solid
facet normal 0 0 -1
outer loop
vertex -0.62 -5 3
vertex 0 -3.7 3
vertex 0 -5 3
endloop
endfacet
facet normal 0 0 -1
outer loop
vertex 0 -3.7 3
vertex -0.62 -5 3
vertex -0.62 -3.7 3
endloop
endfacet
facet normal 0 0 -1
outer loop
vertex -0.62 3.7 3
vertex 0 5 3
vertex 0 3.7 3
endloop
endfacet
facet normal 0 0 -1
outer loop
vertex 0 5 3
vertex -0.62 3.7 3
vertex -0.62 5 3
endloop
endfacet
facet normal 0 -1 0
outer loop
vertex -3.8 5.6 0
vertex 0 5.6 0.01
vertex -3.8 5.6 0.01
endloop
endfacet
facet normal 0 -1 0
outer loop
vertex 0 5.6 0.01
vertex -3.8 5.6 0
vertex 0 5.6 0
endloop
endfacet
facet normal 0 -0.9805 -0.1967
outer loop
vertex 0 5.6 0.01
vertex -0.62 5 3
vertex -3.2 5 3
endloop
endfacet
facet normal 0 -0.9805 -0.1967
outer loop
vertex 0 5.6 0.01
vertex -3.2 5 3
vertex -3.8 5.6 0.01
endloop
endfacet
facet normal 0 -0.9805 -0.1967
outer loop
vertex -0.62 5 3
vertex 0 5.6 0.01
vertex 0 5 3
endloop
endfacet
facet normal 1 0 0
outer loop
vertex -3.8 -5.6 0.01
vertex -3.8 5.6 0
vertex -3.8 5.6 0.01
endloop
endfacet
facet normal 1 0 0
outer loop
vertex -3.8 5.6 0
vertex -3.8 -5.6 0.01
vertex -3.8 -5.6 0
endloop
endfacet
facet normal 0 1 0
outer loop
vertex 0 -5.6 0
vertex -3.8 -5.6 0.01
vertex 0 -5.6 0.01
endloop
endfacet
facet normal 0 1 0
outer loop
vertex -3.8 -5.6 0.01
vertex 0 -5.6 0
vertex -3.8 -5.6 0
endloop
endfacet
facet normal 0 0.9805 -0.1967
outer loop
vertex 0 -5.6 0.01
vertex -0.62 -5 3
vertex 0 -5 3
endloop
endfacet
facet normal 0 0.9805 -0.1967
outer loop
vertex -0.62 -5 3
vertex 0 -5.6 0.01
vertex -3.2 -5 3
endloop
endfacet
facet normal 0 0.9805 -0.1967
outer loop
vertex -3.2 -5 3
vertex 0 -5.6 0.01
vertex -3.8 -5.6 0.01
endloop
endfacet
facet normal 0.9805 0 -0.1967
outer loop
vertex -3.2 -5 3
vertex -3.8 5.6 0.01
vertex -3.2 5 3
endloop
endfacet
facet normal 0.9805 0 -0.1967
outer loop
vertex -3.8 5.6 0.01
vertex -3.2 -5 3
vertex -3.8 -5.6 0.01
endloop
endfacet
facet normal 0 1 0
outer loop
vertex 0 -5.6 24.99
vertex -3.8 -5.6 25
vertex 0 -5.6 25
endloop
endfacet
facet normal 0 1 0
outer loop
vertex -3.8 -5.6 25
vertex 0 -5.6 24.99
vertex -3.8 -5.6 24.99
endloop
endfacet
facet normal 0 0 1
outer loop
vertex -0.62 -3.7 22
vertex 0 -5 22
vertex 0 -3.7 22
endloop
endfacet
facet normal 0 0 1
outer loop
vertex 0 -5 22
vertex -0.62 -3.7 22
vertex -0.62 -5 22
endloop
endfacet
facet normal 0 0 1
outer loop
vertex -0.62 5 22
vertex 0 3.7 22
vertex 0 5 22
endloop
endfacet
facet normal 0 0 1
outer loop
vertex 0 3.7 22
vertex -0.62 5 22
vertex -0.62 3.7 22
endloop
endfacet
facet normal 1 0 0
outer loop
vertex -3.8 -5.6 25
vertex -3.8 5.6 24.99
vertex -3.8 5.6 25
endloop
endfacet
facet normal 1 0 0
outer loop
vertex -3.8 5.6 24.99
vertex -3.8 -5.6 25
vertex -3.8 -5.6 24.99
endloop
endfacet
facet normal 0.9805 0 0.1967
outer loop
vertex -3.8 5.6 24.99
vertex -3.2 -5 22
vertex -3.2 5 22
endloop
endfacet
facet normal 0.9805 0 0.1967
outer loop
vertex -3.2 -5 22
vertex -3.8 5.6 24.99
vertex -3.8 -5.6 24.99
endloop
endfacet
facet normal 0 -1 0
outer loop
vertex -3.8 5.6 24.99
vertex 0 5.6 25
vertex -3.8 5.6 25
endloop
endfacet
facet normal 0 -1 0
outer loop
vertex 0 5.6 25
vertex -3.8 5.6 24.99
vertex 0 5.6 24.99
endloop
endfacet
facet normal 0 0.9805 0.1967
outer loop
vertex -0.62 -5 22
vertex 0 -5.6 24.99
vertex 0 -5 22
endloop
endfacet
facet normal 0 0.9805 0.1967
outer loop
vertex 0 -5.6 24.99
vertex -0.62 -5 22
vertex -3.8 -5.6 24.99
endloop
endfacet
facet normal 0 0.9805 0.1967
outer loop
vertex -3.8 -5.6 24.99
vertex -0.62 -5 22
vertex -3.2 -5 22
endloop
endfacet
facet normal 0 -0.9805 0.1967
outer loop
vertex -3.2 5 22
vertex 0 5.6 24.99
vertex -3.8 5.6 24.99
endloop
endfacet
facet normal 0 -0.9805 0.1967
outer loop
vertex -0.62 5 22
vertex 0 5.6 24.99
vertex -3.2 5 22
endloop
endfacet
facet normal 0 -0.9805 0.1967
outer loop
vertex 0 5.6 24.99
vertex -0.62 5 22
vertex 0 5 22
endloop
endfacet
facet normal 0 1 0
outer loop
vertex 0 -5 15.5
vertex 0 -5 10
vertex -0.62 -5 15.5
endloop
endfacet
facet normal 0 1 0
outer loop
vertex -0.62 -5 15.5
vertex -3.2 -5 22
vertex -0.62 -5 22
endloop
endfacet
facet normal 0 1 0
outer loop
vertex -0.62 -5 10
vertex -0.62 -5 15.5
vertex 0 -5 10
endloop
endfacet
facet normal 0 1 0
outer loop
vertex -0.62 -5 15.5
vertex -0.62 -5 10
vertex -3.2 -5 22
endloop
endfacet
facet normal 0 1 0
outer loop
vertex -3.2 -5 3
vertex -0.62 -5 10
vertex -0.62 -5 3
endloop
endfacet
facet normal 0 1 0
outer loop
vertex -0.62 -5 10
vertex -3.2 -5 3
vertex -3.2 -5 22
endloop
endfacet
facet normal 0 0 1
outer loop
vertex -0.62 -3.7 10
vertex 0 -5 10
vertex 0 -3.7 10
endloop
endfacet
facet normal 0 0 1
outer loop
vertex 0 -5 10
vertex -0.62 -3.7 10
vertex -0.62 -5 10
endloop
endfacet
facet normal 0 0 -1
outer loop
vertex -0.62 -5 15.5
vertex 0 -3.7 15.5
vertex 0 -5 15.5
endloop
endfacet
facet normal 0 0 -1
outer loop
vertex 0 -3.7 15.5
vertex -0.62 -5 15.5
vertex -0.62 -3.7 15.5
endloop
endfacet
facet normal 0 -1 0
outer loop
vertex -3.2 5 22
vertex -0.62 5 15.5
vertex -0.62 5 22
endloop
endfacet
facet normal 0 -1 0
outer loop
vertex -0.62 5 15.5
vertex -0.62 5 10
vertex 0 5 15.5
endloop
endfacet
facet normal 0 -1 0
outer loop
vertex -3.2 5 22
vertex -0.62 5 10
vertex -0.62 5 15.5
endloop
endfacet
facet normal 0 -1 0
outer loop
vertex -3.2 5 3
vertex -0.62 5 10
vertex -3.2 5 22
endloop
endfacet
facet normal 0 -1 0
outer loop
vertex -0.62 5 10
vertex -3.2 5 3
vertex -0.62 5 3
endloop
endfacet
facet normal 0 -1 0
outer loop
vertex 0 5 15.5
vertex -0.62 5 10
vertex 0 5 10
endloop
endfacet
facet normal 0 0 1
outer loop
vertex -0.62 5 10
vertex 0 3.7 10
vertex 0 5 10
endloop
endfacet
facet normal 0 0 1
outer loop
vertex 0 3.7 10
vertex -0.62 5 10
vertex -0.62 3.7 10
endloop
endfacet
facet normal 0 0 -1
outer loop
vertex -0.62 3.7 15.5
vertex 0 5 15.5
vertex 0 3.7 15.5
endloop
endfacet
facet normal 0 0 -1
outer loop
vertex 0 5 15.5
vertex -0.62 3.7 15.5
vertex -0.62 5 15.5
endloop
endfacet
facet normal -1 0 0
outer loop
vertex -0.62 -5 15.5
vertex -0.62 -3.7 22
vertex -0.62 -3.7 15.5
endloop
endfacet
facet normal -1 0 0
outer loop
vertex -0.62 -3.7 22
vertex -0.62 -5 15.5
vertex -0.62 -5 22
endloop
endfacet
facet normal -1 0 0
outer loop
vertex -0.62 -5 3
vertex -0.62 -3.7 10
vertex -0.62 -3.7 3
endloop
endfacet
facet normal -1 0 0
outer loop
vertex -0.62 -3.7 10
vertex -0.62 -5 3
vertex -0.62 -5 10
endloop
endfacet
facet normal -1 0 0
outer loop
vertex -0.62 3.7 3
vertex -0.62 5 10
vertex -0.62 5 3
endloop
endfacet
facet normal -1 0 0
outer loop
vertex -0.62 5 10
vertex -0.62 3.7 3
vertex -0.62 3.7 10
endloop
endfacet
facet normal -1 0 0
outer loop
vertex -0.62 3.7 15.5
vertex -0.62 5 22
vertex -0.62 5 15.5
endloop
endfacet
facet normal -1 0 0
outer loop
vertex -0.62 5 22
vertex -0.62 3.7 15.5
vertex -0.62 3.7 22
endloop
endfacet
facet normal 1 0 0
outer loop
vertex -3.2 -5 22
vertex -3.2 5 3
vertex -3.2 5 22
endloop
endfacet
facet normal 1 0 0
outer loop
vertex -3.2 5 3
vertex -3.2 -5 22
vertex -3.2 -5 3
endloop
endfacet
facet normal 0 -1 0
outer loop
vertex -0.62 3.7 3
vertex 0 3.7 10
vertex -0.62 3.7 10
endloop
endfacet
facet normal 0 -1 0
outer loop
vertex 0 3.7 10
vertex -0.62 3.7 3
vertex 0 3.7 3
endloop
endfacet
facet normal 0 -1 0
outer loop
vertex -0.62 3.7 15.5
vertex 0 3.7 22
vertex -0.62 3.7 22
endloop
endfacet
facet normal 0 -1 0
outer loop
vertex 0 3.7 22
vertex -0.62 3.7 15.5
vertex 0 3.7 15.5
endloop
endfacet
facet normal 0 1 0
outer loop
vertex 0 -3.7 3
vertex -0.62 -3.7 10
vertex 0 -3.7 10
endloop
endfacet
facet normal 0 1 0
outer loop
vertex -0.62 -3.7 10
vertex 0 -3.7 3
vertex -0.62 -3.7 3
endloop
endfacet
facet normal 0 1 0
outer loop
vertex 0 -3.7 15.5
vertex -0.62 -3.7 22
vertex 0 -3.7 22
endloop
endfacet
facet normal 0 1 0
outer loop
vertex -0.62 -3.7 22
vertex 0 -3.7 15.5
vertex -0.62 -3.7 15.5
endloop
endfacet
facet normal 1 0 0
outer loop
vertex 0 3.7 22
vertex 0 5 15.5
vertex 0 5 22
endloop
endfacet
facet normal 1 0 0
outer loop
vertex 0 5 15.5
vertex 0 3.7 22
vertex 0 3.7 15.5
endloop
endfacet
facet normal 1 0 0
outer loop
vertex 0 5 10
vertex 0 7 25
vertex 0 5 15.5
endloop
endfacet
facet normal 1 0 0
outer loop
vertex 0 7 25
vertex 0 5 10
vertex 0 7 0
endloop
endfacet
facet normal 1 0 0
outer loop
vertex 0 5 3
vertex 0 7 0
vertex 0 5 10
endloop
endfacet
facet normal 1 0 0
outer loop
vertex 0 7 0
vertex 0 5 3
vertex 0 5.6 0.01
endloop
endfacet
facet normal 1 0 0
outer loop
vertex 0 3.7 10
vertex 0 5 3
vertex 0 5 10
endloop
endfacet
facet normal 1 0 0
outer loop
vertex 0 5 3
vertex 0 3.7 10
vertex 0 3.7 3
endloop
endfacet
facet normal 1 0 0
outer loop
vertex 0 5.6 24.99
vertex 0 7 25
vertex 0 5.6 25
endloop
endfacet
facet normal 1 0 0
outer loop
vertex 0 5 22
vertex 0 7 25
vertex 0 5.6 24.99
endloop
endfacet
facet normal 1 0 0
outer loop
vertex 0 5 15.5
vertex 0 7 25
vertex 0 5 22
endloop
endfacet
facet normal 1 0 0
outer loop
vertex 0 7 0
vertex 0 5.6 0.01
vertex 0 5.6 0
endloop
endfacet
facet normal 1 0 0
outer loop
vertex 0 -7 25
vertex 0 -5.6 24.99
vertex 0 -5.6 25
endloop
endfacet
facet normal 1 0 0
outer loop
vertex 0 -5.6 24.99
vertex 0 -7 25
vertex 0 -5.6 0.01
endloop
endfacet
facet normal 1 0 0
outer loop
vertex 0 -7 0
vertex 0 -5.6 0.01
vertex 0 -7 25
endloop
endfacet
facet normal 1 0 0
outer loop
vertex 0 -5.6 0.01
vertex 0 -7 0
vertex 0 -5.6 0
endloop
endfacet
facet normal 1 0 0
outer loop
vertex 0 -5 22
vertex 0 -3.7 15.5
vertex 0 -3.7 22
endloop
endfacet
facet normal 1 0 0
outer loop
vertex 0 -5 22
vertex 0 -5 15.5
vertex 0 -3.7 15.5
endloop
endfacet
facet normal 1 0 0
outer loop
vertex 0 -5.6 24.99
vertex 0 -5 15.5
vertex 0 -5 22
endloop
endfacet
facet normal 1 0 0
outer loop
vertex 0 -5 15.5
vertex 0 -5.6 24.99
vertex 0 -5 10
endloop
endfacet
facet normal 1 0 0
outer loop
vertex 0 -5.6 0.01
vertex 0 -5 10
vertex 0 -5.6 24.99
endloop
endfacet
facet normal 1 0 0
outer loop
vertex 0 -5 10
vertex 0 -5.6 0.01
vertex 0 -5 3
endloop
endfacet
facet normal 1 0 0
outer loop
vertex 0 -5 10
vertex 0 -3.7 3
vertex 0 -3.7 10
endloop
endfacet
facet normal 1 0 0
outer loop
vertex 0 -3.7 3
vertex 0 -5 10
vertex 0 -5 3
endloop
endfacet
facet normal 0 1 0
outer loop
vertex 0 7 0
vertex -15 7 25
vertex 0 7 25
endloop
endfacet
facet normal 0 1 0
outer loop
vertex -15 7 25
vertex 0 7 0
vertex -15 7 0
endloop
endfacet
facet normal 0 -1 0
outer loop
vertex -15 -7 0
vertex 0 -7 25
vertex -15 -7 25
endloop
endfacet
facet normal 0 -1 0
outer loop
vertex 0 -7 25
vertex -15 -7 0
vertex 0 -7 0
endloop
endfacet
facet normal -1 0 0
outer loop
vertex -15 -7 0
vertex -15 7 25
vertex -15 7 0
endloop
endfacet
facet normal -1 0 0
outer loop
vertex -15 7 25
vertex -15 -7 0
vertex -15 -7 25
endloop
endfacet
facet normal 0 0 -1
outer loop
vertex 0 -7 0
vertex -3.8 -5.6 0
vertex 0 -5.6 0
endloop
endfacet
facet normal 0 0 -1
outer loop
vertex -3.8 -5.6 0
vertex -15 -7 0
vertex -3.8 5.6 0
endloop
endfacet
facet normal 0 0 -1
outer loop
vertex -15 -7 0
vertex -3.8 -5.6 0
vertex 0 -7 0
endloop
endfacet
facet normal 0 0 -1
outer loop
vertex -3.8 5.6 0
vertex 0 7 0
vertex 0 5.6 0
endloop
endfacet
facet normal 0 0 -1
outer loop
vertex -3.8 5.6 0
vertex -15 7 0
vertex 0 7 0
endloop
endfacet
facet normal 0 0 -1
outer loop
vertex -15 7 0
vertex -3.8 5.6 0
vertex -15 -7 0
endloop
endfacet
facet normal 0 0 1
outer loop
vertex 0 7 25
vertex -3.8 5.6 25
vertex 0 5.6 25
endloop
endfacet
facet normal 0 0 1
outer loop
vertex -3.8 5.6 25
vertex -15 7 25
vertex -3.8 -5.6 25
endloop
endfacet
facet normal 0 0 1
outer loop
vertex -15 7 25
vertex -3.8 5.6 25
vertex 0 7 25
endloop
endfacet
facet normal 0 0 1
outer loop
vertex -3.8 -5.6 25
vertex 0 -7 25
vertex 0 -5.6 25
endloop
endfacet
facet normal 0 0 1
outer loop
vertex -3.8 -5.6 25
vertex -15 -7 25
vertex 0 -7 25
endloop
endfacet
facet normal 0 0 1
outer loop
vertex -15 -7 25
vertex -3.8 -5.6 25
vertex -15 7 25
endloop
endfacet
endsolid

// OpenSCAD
// file: ../../lib/joycon_rail.scad
// ============================================================
// Nintendo Switch (1) Joy-Con female rail
// Part of ControllerCyclingMounts.  Use with:  use <../../lib/joycon_rail.scad>
//
// Profile measured from the community "Joycon Grip w/ Front Look LED
// Window" model and confirmed by test print (fits Switch 1 Joy-Cons).
// NOT compatible with Joy-Con 2 (magnetic attachment).
//
// Local frame for all modules here:
//   rail face at x = 0, material at x < 0
//   rail runs along +Y; the open end (where the Joy-Con's shoulder
//   end ends up) is at y = len, the closed end at y = 0
//   z = 0 is the rail centreline (Joy-Con is ~14 mm thick, centred)
// ============================================================

JC_SLOT_W   = 7.40;  // opening between the two lips
JC_LIP_T    = 0.62;  // lip thickness
JC_INNER_W  = 10.0;  // height of the undercut cavity
JC_INNER_D  = 2.58;  // depth of the cavity behind the lips
JC_RAIL_LEN = 92.5;  // channel length; the Joy-Con bottoms out at the end
JC_BODY_T   = 14;    // Joy-Con thickness at the rail

// Total depth of the channel below the rail face
function joycon_rail_depth() = JC_LIP_T + JC_INNER_D;

// Subtract this from a solid. The channel starts at y = len - rail_len
// and is open past y = len.
//   lead_in     flare at the entrance
//   notch_*     latch notches (cut into both lips)
//   end_slope   closed end sloped (x this many channel depths) so it
//               prints without bridging when the rail stands vertically
//   open_both_ends  for short test pieces
module joycon_rail_channel(len = JC_RAIL_LEN, rail_len = JC_RAIL_LEN,
                           lead_in = 0.6, notch_from = 10.0, notch_len = 5.5,
                           end_slope = 2, open_both_ends = false) {
    eps = 0.01;
    y0 = len - rail_len;
    cd = JC_LIP_T + JC_INNER_D;
    ext = open_both_ends ? 1 : 0;
    translate([-cd, y0 - ext, -JC_INNER_W/2]) cube([JC_INNER_D, rail_len + 1 + ext, JC_INNER_W]);
    translate([-JC_LIP_T - eps, y0 - ext, -JC_SLOT_W/2]) cube([JC_LIP_T + 1, rail_len + 1 + ext, JC_SLOT_W]);
    if (!open_both_ends && end_slope > 0)
        hull() {
            translate([-cd, y0, -JC_INNER_W/2]) cube([cd + 1, eps, JC_INNER_W]);
            translate([0, y0 - end_slope * cd, -JC_INNER_W/2]) cube([1, eps, JC_INNER_W]);
        }
    // entrance flare(s)
    for (e = open_both_ends ? [0, 1] : [0])
        translate([0, e == 0 ? len : y0, 0]) mirror([0, e == 0 ? 0 : 1, 0])
            hull() {
                translate([-cd - lead_in, -eps, -JC_INNER_W/2 - lead_in])
                    cube([cd + lead_in + 1, 1, JC_INNER_W + 2 * lead_in]);
                translate([-cd, -3, -JC_INNER_W/2]) cube([cd + 1, eps, JC_INNER_W]);
            }
    // latch notches in both lips
    nd = (JC_INNER_W - JC_SLOT_W) / 2;
    for (s = [-1, 1])
        translate([-JC_LIP_T - 0.3, len - notch_from - notch_len,
                   s < 0 ? -JC_INNER_W/2 : JC_SLOT_W/2 - eps])
            cube([JC_LIP_T + 1, notch_len, nd + eps]);
}

// Short piece of rail for checking fit on your printer.
// Printed standing up (channel vertical), the way the full mounts print.
module joycon_rail_test(len = 25, block_w = 15, block_t = JC_BODY_T) {
    rotate([-90, 0, 0]) translate([0, -len, 0]) difference() {
        translate([-block_w, 0, -block_t/2]) cube([block_w, len, block_t]);
        joycon_rail_channel(len = len, rail_len = len, open_both_ends = true);
    }
}
// main file
// ============================================================
// Joy-Con rail test print  (ControllerCyclingMounts)
// A 25 mm piece of the Switch (1) Joy-Con rail used by every
// Joy-Con mount in this repo. Print it before a full mount to check
// your printer's tolerances. ~5 g, ~15 min.
//
// Print: as exported (standing up, channel vertical). No supports.
//        Same orientation as the full mounts.
//
// What to check:
//   - The Joy-Con slides in from the flared end with light, even
//     friction (no wobble, no forcing).
//   - Its latch clicks into the notch about 10-15 mm in, and the
//     release button lets it slide back out.
//   Too tight: lower your flow / check elephant foot at the entrance.
//   Too loose: raise flow slightly. The profile is in ../lib/joycon_rail.scad.
// ============================================================
use <../../lib/joycon_rail.scad>

/* [Test piece] */
length  = 25;   // mm of rail
block_w = 15;   // material behind the rail face

joycon_rail_test(len = length, block_w = block_w);
